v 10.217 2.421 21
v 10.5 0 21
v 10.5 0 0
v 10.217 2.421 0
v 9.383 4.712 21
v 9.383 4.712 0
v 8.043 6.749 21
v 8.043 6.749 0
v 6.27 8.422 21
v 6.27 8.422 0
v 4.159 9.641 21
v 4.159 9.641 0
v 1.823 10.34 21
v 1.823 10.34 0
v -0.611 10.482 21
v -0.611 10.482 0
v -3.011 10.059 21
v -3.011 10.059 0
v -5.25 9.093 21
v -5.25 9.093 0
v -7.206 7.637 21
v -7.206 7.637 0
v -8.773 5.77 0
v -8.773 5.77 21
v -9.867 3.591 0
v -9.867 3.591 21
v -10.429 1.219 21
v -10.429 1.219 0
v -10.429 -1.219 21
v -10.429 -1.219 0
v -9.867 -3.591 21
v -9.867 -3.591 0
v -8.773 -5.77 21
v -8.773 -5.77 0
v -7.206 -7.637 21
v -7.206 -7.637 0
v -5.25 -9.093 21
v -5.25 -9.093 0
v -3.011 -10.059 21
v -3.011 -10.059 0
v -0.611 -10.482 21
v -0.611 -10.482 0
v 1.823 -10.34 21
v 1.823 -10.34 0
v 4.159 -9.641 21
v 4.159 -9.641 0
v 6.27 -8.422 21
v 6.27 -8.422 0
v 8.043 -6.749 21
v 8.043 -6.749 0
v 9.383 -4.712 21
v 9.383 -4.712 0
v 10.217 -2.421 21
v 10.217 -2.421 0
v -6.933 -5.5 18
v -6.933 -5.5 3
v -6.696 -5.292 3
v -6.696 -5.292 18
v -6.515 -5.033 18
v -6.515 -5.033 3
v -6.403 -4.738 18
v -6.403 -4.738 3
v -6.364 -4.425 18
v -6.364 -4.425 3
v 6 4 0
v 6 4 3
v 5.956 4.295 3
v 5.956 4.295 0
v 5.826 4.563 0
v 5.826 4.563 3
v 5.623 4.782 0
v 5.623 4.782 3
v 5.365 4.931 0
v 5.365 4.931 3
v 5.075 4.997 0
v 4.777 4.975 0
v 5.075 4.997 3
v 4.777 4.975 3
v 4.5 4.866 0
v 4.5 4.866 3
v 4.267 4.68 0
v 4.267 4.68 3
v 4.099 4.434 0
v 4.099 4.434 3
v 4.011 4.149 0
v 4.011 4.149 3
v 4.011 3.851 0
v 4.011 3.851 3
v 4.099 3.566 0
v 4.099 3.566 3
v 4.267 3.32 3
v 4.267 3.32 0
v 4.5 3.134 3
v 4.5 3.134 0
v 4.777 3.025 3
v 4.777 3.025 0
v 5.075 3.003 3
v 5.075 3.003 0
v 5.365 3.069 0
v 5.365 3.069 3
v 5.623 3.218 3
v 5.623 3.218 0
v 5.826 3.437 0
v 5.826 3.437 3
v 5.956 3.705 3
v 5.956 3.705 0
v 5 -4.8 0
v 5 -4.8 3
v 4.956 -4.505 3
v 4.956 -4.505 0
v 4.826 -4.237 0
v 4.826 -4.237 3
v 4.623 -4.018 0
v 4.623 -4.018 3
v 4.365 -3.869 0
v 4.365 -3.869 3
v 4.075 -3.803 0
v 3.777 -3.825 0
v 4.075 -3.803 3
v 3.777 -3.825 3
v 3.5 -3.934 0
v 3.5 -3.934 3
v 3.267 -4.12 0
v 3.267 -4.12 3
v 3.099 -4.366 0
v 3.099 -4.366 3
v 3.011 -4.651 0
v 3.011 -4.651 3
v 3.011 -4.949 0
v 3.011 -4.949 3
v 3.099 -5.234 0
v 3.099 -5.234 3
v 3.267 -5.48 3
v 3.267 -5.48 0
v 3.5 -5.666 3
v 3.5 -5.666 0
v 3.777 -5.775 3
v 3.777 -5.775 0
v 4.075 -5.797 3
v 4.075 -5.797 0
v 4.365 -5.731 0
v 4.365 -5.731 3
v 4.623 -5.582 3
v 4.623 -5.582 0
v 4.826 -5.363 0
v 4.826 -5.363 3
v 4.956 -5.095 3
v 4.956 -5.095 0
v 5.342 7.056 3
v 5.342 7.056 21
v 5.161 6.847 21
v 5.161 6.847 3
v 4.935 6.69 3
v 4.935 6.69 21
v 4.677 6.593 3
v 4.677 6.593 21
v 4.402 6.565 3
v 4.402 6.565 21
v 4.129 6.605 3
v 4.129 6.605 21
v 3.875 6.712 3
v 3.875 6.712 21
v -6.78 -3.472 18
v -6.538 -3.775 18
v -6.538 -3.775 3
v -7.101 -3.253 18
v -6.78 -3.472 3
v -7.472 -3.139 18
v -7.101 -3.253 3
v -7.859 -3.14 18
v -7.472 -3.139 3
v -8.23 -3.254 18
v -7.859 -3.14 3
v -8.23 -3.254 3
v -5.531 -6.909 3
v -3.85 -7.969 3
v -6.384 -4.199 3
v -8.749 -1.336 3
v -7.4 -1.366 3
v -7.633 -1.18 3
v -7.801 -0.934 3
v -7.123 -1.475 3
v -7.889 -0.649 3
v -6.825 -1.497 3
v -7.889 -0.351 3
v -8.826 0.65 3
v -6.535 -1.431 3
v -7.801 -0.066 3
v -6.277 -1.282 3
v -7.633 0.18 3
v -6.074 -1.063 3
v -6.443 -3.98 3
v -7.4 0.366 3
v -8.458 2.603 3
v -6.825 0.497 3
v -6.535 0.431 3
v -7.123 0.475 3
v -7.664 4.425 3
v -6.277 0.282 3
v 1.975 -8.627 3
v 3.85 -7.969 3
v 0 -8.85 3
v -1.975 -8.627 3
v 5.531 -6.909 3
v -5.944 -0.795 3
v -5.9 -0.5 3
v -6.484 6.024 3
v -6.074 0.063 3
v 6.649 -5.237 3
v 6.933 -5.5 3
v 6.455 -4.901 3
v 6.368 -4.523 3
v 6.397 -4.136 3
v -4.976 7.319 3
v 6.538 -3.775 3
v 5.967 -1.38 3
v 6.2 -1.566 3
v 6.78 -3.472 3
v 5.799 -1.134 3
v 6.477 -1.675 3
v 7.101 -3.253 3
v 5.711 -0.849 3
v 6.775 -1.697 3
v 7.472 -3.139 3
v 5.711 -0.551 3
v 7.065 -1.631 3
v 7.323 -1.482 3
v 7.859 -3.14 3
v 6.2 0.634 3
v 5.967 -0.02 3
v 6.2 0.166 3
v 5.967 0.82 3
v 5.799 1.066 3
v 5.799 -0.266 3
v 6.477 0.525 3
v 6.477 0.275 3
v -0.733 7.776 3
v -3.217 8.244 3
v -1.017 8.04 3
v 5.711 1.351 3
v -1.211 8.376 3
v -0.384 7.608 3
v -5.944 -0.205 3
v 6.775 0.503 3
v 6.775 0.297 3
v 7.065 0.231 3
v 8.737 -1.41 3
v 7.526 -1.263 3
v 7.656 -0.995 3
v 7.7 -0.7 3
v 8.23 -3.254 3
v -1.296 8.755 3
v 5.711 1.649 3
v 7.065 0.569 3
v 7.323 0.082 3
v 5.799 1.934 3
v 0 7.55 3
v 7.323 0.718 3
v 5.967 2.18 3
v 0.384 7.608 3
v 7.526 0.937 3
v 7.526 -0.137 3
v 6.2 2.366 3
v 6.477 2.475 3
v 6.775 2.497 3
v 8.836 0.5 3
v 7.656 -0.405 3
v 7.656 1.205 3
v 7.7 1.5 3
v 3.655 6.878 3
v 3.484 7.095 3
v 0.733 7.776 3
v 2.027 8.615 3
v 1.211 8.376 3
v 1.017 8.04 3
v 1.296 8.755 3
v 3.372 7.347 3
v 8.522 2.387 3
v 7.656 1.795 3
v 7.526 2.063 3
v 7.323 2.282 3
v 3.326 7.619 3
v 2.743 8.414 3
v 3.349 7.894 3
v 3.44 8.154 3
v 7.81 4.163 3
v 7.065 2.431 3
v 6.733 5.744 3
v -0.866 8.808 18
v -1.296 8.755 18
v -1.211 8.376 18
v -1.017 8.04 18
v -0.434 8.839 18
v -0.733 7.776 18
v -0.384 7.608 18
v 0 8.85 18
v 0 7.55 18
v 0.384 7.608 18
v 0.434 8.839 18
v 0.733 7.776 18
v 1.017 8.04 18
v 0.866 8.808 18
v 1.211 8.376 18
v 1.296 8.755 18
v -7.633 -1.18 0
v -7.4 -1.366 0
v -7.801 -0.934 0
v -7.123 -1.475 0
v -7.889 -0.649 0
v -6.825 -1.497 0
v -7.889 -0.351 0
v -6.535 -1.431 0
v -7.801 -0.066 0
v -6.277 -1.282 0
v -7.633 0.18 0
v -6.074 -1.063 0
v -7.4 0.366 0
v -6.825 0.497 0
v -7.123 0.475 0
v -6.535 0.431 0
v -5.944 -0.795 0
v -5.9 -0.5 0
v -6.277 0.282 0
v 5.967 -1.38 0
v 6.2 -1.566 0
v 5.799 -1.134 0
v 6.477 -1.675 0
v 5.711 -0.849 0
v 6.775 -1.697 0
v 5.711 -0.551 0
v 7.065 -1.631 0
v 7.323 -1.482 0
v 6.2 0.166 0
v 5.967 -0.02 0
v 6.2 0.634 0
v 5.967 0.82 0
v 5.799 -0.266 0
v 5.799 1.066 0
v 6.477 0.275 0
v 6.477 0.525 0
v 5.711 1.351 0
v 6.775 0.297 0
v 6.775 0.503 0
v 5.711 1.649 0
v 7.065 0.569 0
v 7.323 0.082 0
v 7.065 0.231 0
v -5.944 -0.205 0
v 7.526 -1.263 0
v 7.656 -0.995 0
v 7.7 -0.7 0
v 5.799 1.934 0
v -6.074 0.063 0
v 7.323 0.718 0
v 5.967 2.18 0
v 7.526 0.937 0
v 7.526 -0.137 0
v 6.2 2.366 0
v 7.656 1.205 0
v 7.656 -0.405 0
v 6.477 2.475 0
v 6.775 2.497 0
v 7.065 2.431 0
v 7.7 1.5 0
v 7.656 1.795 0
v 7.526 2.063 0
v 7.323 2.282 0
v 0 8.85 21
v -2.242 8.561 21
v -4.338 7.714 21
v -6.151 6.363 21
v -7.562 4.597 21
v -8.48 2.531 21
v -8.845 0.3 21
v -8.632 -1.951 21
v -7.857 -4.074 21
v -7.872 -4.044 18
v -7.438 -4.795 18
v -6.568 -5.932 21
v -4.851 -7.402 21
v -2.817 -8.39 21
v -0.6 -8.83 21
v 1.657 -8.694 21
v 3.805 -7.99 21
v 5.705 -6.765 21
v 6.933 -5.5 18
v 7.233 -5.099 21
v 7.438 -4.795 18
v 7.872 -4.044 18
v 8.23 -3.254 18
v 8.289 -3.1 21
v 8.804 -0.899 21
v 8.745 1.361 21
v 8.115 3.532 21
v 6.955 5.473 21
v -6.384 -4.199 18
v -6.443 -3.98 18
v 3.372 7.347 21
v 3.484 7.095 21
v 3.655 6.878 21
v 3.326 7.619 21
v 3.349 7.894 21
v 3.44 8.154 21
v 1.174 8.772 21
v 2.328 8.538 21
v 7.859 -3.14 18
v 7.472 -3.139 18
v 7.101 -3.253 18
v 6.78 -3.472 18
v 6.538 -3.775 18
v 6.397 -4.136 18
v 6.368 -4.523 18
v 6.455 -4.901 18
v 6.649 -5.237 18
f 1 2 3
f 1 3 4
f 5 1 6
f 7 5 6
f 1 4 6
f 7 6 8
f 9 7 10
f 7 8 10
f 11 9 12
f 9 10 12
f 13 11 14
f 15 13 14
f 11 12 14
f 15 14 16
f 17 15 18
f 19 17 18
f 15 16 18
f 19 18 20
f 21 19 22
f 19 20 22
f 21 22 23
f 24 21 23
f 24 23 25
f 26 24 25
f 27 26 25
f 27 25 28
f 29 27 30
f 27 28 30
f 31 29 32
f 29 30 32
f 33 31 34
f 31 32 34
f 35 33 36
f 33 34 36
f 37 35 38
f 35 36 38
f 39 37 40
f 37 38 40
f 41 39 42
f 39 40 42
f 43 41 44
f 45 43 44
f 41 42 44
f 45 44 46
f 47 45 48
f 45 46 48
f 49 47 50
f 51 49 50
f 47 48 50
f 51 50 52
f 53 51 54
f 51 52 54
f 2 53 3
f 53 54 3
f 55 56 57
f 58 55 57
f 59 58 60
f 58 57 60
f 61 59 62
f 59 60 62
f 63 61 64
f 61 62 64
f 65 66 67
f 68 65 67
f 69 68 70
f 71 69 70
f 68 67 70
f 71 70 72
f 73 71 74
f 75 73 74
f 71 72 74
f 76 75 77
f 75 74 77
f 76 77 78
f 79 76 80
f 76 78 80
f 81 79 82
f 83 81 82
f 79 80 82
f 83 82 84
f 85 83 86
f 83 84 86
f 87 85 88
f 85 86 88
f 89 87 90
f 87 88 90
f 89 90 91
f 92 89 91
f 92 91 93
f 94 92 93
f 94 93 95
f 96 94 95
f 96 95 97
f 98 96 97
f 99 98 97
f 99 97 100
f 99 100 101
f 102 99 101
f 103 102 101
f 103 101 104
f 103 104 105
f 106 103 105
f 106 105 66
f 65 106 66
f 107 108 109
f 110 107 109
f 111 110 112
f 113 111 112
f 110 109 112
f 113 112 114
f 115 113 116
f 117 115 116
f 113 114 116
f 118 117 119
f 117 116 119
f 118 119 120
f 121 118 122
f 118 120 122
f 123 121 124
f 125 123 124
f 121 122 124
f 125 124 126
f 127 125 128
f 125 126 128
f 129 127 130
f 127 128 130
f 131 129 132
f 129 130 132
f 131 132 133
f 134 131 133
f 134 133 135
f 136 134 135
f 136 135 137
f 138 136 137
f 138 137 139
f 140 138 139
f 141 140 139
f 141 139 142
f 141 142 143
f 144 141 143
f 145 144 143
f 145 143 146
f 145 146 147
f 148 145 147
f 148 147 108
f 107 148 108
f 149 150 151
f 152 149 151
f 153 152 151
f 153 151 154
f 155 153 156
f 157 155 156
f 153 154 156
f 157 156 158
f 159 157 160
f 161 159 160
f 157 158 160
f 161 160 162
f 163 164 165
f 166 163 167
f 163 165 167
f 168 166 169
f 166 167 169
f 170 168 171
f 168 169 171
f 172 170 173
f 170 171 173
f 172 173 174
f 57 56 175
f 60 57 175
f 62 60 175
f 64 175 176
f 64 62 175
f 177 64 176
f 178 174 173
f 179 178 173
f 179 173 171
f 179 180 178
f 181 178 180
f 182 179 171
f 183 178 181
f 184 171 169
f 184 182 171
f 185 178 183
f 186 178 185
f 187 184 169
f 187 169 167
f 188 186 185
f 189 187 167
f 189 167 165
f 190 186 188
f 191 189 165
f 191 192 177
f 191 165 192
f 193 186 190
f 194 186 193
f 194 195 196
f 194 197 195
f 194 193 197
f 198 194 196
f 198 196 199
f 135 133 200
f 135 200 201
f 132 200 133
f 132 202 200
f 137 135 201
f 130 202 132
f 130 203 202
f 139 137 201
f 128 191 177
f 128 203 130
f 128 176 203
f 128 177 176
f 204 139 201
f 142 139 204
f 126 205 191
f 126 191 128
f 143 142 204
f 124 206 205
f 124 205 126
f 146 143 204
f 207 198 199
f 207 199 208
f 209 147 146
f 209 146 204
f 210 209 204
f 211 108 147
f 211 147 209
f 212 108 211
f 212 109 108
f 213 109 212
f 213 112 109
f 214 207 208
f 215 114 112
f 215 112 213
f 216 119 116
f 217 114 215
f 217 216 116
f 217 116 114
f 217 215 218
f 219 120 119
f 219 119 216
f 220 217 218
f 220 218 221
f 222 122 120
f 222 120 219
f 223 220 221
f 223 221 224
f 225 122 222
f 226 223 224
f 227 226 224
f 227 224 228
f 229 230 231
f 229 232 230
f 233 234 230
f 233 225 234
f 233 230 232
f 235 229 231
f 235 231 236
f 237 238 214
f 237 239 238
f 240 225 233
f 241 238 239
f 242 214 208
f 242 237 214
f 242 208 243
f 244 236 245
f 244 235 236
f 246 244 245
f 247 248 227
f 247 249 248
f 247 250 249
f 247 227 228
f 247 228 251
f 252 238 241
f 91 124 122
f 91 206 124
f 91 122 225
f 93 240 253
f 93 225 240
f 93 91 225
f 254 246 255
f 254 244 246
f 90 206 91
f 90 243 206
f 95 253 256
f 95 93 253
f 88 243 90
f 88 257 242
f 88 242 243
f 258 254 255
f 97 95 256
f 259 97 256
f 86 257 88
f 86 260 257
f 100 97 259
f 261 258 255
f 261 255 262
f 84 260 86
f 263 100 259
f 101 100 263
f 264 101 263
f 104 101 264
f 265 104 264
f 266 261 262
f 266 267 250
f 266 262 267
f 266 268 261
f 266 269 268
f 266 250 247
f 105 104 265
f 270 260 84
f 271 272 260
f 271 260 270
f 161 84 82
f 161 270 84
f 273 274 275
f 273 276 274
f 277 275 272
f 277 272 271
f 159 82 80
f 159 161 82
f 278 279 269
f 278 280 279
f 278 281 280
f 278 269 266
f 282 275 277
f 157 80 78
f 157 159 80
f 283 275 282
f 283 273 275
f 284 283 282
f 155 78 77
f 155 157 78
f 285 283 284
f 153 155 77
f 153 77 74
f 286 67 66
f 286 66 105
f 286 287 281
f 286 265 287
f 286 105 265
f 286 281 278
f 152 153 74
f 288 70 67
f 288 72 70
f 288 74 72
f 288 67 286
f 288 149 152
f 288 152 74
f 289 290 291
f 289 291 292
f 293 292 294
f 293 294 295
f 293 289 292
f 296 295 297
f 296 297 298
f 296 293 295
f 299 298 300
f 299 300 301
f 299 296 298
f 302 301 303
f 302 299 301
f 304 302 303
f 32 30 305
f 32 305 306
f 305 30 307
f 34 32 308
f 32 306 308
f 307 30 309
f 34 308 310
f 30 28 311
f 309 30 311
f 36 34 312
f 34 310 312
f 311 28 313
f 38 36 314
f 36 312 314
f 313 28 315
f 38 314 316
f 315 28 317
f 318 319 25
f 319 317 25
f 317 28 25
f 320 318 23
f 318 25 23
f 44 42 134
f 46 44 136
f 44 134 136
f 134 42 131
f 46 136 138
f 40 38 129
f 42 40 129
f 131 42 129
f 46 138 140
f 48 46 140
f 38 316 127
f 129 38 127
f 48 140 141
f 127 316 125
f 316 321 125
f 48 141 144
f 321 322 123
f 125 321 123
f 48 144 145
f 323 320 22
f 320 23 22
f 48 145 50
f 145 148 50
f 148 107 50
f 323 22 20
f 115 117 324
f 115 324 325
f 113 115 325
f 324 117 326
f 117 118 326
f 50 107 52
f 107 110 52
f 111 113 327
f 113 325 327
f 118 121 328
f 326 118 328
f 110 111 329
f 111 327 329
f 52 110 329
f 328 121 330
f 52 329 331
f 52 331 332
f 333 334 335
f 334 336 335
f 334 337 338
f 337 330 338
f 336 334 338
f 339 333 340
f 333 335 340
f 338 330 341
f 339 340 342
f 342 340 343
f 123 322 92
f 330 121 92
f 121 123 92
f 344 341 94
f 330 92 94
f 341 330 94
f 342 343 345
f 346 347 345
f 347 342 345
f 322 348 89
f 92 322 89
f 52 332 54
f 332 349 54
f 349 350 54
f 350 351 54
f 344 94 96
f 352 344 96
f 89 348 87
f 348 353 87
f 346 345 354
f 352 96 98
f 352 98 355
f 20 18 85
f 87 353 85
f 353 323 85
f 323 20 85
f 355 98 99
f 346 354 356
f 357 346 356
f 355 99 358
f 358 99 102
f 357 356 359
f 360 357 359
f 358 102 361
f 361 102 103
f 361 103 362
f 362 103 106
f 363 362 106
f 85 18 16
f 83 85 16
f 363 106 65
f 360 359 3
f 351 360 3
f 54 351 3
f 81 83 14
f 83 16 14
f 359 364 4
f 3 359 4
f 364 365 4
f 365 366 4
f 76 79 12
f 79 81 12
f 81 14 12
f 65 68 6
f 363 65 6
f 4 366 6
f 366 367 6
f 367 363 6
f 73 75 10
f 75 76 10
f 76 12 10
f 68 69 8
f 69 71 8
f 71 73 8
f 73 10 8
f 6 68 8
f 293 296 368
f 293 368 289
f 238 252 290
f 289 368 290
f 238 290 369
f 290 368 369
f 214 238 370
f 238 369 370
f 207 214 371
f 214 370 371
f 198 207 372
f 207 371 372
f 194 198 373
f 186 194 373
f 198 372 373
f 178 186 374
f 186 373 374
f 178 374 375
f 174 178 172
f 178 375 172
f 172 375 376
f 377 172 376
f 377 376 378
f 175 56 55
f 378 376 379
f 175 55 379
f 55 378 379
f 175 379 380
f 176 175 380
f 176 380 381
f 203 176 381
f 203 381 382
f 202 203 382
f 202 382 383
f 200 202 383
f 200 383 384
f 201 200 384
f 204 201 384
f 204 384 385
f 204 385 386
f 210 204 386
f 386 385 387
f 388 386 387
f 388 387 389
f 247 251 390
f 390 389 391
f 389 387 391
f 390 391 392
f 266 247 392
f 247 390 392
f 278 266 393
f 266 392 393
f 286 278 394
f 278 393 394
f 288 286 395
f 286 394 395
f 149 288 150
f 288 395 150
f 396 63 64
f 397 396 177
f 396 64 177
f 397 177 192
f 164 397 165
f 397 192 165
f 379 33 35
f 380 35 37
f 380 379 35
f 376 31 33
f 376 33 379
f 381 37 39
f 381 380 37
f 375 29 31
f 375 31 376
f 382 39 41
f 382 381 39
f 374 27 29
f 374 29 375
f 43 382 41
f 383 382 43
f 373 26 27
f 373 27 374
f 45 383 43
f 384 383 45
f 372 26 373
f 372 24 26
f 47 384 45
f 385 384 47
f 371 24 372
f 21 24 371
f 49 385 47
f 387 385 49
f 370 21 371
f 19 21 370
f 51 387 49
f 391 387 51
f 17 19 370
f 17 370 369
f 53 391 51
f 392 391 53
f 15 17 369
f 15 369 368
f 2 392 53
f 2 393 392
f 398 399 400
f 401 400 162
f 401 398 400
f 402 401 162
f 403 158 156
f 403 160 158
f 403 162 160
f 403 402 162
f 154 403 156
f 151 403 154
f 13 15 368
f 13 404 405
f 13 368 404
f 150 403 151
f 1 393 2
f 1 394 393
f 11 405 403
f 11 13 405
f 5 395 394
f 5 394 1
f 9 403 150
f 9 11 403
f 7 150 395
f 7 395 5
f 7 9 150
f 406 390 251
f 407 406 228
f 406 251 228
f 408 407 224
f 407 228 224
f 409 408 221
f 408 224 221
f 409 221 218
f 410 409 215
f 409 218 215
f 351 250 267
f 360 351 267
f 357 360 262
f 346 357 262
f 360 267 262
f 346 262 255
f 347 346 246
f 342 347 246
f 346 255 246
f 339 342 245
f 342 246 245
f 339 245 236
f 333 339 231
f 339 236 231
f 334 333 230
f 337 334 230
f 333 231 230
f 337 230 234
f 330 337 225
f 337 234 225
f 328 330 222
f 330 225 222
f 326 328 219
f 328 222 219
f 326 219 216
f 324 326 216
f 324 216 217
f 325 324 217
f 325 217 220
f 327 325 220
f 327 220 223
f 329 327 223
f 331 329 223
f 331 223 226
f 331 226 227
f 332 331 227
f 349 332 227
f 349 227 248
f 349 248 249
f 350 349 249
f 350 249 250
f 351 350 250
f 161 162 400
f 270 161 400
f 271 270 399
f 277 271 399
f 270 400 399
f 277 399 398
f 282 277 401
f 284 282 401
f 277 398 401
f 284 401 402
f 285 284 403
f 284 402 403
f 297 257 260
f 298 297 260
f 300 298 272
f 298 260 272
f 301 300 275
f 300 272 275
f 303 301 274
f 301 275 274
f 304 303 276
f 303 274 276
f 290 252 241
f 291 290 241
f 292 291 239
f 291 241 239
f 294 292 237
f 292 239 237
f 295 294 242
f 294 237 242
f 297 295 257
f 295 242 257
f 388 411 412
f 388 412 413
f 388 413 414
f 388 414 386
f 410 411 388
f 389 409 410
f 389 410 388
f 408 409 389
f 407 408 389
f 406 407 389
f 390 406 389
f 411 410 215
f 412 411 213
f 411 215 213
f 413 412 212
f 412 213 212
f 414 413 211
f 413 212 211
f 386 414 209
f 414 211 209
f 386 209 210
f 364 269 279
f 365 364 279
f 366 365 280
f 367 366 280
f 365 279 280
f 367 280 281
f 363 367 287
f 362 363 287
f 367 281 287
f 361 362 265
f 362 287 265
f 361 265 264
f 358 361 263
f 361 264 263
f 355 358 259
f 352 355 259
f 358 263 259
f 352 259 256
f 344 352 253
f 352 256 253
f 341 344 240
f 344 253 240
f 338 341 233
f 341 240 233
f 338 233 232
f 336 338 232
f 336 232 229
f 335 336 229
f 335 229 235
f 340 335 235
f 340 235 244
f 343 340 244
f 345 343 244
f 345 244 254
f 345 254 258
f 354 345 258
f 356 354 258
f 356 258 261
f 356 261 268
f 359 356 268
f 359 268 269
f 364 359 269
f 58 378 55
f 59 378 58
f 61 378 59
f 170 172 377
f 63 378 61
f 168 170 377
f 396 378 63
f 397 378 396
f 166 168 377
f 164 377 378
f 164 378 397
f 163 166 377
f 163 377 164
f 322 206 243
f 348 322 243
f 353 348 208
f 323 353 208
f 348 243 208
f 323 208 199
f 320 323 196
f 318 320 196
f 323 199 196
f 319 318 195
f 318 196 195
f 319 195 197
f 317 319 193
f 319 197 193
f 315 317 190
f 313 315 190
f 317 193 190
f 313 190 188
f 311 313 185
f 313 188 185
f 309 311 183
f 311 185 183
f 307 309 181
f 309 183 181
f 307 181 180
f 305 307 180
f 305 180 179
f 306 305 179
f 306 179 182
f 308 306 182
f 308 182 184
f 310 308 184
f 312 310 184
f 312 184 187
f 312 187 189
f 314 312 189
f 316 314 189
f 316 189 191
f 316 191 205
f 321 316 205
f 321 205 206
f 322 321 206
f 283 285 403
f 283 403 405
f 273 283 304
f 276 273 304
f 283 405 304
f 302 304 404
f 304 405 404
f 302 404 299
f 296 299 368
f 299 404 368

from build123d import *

# Parameters (mm, degrees)
F0_R     = 10.5
F1_DEPTH = 21
F3_DEPTH = 18
F4_R     = 1
F5_DEPTH = 25
F7_DEPTH = 15


with BuildPart() as f1:
    # F0 (on Top) → F1 (new body)
    with BuildSketch(Plane.XY):
        Circle(F0_R)
    extrude(amount=F1_DEPTH)

    # F2 (on face) → F3 (cut)
    with BuildSketch(Plane.XY.offset(21)):
        with BuildLine():
            ThreePointArc((3.875, 6.711697), (3.371846, 7.346729), (3.440033, 8.154059))
            ThreePointArc((3.440033, 8.154059), (1.754862, 8.67427), (0, 8.85))
            Line((0, 8.85), (0, 0))
            Line((0, 0), (3.875, 6.711697))
        make_face()
        with BuildLine():
            Line((0, 0), (0, 8.85))
            ThreePointArc((0, 8.85), (-2.81738, -8.389569), (5.341606, 7.056185))
            ThreePointArc((5.341606, 7.056185), (4.676531, 6.593469), (3.875, 6.711697))
            Line((3.875, 6.711697), (0, 0))
        make_face()
    extrude(amount=-F3_DEPTH, mode=Mode.SUBTRACT)

    # F4 (on face) → F5 (cut)
    with BuildSketch(Plane.XY.offset(3)):
        with Locations((-6.9, -0.5)):
            Circle(F4_R)
        with Locations((5, 4)):
            Circle(F4_R)
        with Locations((6.7, 1.5)):
            Circle(F4_R)
        with Locations((4, -4.8)):
            Circle(F4_R)
        with Locations((6.7, -0.7)):
            Circle(F4_R)
    extrude(amount=-F5_DEPTH, mode=Mode.SUBTRACT)

    # F6 (on face) → F7 (join)
    with BuildSketch(Plane.XY.offset(3)):
        with BuildLine():
            ThreePointArc((0, 7.55), (0.919239, 7.930761), (1.3, 8.85))
            ThreePointArc((1.3, 8.85), (-0.919239, 9.769239), (0, 7.55))
        make_face()
        with BuildLine():
            ThreePointArc((8.964325, -4.425), (8.00079, -3.169296), (6.538492, -3.775))
            ThreePointArc((6.538492, -3.775), (7.32786, -5.680704), (8.964325, -4.425))
        make_face()
        with BuildLine():
            ThreePointArc((-6.364325, -4.425), (-6.408621, -4.088535), (-6.538492, -3.775))
            ThreePointArc((-6.538492, -3.775), (-8.920028, -4.761465), (-6.364325, -4.425))
        make_face()
    extrude(amount=F7_DEPTH)


solid = f1.part
